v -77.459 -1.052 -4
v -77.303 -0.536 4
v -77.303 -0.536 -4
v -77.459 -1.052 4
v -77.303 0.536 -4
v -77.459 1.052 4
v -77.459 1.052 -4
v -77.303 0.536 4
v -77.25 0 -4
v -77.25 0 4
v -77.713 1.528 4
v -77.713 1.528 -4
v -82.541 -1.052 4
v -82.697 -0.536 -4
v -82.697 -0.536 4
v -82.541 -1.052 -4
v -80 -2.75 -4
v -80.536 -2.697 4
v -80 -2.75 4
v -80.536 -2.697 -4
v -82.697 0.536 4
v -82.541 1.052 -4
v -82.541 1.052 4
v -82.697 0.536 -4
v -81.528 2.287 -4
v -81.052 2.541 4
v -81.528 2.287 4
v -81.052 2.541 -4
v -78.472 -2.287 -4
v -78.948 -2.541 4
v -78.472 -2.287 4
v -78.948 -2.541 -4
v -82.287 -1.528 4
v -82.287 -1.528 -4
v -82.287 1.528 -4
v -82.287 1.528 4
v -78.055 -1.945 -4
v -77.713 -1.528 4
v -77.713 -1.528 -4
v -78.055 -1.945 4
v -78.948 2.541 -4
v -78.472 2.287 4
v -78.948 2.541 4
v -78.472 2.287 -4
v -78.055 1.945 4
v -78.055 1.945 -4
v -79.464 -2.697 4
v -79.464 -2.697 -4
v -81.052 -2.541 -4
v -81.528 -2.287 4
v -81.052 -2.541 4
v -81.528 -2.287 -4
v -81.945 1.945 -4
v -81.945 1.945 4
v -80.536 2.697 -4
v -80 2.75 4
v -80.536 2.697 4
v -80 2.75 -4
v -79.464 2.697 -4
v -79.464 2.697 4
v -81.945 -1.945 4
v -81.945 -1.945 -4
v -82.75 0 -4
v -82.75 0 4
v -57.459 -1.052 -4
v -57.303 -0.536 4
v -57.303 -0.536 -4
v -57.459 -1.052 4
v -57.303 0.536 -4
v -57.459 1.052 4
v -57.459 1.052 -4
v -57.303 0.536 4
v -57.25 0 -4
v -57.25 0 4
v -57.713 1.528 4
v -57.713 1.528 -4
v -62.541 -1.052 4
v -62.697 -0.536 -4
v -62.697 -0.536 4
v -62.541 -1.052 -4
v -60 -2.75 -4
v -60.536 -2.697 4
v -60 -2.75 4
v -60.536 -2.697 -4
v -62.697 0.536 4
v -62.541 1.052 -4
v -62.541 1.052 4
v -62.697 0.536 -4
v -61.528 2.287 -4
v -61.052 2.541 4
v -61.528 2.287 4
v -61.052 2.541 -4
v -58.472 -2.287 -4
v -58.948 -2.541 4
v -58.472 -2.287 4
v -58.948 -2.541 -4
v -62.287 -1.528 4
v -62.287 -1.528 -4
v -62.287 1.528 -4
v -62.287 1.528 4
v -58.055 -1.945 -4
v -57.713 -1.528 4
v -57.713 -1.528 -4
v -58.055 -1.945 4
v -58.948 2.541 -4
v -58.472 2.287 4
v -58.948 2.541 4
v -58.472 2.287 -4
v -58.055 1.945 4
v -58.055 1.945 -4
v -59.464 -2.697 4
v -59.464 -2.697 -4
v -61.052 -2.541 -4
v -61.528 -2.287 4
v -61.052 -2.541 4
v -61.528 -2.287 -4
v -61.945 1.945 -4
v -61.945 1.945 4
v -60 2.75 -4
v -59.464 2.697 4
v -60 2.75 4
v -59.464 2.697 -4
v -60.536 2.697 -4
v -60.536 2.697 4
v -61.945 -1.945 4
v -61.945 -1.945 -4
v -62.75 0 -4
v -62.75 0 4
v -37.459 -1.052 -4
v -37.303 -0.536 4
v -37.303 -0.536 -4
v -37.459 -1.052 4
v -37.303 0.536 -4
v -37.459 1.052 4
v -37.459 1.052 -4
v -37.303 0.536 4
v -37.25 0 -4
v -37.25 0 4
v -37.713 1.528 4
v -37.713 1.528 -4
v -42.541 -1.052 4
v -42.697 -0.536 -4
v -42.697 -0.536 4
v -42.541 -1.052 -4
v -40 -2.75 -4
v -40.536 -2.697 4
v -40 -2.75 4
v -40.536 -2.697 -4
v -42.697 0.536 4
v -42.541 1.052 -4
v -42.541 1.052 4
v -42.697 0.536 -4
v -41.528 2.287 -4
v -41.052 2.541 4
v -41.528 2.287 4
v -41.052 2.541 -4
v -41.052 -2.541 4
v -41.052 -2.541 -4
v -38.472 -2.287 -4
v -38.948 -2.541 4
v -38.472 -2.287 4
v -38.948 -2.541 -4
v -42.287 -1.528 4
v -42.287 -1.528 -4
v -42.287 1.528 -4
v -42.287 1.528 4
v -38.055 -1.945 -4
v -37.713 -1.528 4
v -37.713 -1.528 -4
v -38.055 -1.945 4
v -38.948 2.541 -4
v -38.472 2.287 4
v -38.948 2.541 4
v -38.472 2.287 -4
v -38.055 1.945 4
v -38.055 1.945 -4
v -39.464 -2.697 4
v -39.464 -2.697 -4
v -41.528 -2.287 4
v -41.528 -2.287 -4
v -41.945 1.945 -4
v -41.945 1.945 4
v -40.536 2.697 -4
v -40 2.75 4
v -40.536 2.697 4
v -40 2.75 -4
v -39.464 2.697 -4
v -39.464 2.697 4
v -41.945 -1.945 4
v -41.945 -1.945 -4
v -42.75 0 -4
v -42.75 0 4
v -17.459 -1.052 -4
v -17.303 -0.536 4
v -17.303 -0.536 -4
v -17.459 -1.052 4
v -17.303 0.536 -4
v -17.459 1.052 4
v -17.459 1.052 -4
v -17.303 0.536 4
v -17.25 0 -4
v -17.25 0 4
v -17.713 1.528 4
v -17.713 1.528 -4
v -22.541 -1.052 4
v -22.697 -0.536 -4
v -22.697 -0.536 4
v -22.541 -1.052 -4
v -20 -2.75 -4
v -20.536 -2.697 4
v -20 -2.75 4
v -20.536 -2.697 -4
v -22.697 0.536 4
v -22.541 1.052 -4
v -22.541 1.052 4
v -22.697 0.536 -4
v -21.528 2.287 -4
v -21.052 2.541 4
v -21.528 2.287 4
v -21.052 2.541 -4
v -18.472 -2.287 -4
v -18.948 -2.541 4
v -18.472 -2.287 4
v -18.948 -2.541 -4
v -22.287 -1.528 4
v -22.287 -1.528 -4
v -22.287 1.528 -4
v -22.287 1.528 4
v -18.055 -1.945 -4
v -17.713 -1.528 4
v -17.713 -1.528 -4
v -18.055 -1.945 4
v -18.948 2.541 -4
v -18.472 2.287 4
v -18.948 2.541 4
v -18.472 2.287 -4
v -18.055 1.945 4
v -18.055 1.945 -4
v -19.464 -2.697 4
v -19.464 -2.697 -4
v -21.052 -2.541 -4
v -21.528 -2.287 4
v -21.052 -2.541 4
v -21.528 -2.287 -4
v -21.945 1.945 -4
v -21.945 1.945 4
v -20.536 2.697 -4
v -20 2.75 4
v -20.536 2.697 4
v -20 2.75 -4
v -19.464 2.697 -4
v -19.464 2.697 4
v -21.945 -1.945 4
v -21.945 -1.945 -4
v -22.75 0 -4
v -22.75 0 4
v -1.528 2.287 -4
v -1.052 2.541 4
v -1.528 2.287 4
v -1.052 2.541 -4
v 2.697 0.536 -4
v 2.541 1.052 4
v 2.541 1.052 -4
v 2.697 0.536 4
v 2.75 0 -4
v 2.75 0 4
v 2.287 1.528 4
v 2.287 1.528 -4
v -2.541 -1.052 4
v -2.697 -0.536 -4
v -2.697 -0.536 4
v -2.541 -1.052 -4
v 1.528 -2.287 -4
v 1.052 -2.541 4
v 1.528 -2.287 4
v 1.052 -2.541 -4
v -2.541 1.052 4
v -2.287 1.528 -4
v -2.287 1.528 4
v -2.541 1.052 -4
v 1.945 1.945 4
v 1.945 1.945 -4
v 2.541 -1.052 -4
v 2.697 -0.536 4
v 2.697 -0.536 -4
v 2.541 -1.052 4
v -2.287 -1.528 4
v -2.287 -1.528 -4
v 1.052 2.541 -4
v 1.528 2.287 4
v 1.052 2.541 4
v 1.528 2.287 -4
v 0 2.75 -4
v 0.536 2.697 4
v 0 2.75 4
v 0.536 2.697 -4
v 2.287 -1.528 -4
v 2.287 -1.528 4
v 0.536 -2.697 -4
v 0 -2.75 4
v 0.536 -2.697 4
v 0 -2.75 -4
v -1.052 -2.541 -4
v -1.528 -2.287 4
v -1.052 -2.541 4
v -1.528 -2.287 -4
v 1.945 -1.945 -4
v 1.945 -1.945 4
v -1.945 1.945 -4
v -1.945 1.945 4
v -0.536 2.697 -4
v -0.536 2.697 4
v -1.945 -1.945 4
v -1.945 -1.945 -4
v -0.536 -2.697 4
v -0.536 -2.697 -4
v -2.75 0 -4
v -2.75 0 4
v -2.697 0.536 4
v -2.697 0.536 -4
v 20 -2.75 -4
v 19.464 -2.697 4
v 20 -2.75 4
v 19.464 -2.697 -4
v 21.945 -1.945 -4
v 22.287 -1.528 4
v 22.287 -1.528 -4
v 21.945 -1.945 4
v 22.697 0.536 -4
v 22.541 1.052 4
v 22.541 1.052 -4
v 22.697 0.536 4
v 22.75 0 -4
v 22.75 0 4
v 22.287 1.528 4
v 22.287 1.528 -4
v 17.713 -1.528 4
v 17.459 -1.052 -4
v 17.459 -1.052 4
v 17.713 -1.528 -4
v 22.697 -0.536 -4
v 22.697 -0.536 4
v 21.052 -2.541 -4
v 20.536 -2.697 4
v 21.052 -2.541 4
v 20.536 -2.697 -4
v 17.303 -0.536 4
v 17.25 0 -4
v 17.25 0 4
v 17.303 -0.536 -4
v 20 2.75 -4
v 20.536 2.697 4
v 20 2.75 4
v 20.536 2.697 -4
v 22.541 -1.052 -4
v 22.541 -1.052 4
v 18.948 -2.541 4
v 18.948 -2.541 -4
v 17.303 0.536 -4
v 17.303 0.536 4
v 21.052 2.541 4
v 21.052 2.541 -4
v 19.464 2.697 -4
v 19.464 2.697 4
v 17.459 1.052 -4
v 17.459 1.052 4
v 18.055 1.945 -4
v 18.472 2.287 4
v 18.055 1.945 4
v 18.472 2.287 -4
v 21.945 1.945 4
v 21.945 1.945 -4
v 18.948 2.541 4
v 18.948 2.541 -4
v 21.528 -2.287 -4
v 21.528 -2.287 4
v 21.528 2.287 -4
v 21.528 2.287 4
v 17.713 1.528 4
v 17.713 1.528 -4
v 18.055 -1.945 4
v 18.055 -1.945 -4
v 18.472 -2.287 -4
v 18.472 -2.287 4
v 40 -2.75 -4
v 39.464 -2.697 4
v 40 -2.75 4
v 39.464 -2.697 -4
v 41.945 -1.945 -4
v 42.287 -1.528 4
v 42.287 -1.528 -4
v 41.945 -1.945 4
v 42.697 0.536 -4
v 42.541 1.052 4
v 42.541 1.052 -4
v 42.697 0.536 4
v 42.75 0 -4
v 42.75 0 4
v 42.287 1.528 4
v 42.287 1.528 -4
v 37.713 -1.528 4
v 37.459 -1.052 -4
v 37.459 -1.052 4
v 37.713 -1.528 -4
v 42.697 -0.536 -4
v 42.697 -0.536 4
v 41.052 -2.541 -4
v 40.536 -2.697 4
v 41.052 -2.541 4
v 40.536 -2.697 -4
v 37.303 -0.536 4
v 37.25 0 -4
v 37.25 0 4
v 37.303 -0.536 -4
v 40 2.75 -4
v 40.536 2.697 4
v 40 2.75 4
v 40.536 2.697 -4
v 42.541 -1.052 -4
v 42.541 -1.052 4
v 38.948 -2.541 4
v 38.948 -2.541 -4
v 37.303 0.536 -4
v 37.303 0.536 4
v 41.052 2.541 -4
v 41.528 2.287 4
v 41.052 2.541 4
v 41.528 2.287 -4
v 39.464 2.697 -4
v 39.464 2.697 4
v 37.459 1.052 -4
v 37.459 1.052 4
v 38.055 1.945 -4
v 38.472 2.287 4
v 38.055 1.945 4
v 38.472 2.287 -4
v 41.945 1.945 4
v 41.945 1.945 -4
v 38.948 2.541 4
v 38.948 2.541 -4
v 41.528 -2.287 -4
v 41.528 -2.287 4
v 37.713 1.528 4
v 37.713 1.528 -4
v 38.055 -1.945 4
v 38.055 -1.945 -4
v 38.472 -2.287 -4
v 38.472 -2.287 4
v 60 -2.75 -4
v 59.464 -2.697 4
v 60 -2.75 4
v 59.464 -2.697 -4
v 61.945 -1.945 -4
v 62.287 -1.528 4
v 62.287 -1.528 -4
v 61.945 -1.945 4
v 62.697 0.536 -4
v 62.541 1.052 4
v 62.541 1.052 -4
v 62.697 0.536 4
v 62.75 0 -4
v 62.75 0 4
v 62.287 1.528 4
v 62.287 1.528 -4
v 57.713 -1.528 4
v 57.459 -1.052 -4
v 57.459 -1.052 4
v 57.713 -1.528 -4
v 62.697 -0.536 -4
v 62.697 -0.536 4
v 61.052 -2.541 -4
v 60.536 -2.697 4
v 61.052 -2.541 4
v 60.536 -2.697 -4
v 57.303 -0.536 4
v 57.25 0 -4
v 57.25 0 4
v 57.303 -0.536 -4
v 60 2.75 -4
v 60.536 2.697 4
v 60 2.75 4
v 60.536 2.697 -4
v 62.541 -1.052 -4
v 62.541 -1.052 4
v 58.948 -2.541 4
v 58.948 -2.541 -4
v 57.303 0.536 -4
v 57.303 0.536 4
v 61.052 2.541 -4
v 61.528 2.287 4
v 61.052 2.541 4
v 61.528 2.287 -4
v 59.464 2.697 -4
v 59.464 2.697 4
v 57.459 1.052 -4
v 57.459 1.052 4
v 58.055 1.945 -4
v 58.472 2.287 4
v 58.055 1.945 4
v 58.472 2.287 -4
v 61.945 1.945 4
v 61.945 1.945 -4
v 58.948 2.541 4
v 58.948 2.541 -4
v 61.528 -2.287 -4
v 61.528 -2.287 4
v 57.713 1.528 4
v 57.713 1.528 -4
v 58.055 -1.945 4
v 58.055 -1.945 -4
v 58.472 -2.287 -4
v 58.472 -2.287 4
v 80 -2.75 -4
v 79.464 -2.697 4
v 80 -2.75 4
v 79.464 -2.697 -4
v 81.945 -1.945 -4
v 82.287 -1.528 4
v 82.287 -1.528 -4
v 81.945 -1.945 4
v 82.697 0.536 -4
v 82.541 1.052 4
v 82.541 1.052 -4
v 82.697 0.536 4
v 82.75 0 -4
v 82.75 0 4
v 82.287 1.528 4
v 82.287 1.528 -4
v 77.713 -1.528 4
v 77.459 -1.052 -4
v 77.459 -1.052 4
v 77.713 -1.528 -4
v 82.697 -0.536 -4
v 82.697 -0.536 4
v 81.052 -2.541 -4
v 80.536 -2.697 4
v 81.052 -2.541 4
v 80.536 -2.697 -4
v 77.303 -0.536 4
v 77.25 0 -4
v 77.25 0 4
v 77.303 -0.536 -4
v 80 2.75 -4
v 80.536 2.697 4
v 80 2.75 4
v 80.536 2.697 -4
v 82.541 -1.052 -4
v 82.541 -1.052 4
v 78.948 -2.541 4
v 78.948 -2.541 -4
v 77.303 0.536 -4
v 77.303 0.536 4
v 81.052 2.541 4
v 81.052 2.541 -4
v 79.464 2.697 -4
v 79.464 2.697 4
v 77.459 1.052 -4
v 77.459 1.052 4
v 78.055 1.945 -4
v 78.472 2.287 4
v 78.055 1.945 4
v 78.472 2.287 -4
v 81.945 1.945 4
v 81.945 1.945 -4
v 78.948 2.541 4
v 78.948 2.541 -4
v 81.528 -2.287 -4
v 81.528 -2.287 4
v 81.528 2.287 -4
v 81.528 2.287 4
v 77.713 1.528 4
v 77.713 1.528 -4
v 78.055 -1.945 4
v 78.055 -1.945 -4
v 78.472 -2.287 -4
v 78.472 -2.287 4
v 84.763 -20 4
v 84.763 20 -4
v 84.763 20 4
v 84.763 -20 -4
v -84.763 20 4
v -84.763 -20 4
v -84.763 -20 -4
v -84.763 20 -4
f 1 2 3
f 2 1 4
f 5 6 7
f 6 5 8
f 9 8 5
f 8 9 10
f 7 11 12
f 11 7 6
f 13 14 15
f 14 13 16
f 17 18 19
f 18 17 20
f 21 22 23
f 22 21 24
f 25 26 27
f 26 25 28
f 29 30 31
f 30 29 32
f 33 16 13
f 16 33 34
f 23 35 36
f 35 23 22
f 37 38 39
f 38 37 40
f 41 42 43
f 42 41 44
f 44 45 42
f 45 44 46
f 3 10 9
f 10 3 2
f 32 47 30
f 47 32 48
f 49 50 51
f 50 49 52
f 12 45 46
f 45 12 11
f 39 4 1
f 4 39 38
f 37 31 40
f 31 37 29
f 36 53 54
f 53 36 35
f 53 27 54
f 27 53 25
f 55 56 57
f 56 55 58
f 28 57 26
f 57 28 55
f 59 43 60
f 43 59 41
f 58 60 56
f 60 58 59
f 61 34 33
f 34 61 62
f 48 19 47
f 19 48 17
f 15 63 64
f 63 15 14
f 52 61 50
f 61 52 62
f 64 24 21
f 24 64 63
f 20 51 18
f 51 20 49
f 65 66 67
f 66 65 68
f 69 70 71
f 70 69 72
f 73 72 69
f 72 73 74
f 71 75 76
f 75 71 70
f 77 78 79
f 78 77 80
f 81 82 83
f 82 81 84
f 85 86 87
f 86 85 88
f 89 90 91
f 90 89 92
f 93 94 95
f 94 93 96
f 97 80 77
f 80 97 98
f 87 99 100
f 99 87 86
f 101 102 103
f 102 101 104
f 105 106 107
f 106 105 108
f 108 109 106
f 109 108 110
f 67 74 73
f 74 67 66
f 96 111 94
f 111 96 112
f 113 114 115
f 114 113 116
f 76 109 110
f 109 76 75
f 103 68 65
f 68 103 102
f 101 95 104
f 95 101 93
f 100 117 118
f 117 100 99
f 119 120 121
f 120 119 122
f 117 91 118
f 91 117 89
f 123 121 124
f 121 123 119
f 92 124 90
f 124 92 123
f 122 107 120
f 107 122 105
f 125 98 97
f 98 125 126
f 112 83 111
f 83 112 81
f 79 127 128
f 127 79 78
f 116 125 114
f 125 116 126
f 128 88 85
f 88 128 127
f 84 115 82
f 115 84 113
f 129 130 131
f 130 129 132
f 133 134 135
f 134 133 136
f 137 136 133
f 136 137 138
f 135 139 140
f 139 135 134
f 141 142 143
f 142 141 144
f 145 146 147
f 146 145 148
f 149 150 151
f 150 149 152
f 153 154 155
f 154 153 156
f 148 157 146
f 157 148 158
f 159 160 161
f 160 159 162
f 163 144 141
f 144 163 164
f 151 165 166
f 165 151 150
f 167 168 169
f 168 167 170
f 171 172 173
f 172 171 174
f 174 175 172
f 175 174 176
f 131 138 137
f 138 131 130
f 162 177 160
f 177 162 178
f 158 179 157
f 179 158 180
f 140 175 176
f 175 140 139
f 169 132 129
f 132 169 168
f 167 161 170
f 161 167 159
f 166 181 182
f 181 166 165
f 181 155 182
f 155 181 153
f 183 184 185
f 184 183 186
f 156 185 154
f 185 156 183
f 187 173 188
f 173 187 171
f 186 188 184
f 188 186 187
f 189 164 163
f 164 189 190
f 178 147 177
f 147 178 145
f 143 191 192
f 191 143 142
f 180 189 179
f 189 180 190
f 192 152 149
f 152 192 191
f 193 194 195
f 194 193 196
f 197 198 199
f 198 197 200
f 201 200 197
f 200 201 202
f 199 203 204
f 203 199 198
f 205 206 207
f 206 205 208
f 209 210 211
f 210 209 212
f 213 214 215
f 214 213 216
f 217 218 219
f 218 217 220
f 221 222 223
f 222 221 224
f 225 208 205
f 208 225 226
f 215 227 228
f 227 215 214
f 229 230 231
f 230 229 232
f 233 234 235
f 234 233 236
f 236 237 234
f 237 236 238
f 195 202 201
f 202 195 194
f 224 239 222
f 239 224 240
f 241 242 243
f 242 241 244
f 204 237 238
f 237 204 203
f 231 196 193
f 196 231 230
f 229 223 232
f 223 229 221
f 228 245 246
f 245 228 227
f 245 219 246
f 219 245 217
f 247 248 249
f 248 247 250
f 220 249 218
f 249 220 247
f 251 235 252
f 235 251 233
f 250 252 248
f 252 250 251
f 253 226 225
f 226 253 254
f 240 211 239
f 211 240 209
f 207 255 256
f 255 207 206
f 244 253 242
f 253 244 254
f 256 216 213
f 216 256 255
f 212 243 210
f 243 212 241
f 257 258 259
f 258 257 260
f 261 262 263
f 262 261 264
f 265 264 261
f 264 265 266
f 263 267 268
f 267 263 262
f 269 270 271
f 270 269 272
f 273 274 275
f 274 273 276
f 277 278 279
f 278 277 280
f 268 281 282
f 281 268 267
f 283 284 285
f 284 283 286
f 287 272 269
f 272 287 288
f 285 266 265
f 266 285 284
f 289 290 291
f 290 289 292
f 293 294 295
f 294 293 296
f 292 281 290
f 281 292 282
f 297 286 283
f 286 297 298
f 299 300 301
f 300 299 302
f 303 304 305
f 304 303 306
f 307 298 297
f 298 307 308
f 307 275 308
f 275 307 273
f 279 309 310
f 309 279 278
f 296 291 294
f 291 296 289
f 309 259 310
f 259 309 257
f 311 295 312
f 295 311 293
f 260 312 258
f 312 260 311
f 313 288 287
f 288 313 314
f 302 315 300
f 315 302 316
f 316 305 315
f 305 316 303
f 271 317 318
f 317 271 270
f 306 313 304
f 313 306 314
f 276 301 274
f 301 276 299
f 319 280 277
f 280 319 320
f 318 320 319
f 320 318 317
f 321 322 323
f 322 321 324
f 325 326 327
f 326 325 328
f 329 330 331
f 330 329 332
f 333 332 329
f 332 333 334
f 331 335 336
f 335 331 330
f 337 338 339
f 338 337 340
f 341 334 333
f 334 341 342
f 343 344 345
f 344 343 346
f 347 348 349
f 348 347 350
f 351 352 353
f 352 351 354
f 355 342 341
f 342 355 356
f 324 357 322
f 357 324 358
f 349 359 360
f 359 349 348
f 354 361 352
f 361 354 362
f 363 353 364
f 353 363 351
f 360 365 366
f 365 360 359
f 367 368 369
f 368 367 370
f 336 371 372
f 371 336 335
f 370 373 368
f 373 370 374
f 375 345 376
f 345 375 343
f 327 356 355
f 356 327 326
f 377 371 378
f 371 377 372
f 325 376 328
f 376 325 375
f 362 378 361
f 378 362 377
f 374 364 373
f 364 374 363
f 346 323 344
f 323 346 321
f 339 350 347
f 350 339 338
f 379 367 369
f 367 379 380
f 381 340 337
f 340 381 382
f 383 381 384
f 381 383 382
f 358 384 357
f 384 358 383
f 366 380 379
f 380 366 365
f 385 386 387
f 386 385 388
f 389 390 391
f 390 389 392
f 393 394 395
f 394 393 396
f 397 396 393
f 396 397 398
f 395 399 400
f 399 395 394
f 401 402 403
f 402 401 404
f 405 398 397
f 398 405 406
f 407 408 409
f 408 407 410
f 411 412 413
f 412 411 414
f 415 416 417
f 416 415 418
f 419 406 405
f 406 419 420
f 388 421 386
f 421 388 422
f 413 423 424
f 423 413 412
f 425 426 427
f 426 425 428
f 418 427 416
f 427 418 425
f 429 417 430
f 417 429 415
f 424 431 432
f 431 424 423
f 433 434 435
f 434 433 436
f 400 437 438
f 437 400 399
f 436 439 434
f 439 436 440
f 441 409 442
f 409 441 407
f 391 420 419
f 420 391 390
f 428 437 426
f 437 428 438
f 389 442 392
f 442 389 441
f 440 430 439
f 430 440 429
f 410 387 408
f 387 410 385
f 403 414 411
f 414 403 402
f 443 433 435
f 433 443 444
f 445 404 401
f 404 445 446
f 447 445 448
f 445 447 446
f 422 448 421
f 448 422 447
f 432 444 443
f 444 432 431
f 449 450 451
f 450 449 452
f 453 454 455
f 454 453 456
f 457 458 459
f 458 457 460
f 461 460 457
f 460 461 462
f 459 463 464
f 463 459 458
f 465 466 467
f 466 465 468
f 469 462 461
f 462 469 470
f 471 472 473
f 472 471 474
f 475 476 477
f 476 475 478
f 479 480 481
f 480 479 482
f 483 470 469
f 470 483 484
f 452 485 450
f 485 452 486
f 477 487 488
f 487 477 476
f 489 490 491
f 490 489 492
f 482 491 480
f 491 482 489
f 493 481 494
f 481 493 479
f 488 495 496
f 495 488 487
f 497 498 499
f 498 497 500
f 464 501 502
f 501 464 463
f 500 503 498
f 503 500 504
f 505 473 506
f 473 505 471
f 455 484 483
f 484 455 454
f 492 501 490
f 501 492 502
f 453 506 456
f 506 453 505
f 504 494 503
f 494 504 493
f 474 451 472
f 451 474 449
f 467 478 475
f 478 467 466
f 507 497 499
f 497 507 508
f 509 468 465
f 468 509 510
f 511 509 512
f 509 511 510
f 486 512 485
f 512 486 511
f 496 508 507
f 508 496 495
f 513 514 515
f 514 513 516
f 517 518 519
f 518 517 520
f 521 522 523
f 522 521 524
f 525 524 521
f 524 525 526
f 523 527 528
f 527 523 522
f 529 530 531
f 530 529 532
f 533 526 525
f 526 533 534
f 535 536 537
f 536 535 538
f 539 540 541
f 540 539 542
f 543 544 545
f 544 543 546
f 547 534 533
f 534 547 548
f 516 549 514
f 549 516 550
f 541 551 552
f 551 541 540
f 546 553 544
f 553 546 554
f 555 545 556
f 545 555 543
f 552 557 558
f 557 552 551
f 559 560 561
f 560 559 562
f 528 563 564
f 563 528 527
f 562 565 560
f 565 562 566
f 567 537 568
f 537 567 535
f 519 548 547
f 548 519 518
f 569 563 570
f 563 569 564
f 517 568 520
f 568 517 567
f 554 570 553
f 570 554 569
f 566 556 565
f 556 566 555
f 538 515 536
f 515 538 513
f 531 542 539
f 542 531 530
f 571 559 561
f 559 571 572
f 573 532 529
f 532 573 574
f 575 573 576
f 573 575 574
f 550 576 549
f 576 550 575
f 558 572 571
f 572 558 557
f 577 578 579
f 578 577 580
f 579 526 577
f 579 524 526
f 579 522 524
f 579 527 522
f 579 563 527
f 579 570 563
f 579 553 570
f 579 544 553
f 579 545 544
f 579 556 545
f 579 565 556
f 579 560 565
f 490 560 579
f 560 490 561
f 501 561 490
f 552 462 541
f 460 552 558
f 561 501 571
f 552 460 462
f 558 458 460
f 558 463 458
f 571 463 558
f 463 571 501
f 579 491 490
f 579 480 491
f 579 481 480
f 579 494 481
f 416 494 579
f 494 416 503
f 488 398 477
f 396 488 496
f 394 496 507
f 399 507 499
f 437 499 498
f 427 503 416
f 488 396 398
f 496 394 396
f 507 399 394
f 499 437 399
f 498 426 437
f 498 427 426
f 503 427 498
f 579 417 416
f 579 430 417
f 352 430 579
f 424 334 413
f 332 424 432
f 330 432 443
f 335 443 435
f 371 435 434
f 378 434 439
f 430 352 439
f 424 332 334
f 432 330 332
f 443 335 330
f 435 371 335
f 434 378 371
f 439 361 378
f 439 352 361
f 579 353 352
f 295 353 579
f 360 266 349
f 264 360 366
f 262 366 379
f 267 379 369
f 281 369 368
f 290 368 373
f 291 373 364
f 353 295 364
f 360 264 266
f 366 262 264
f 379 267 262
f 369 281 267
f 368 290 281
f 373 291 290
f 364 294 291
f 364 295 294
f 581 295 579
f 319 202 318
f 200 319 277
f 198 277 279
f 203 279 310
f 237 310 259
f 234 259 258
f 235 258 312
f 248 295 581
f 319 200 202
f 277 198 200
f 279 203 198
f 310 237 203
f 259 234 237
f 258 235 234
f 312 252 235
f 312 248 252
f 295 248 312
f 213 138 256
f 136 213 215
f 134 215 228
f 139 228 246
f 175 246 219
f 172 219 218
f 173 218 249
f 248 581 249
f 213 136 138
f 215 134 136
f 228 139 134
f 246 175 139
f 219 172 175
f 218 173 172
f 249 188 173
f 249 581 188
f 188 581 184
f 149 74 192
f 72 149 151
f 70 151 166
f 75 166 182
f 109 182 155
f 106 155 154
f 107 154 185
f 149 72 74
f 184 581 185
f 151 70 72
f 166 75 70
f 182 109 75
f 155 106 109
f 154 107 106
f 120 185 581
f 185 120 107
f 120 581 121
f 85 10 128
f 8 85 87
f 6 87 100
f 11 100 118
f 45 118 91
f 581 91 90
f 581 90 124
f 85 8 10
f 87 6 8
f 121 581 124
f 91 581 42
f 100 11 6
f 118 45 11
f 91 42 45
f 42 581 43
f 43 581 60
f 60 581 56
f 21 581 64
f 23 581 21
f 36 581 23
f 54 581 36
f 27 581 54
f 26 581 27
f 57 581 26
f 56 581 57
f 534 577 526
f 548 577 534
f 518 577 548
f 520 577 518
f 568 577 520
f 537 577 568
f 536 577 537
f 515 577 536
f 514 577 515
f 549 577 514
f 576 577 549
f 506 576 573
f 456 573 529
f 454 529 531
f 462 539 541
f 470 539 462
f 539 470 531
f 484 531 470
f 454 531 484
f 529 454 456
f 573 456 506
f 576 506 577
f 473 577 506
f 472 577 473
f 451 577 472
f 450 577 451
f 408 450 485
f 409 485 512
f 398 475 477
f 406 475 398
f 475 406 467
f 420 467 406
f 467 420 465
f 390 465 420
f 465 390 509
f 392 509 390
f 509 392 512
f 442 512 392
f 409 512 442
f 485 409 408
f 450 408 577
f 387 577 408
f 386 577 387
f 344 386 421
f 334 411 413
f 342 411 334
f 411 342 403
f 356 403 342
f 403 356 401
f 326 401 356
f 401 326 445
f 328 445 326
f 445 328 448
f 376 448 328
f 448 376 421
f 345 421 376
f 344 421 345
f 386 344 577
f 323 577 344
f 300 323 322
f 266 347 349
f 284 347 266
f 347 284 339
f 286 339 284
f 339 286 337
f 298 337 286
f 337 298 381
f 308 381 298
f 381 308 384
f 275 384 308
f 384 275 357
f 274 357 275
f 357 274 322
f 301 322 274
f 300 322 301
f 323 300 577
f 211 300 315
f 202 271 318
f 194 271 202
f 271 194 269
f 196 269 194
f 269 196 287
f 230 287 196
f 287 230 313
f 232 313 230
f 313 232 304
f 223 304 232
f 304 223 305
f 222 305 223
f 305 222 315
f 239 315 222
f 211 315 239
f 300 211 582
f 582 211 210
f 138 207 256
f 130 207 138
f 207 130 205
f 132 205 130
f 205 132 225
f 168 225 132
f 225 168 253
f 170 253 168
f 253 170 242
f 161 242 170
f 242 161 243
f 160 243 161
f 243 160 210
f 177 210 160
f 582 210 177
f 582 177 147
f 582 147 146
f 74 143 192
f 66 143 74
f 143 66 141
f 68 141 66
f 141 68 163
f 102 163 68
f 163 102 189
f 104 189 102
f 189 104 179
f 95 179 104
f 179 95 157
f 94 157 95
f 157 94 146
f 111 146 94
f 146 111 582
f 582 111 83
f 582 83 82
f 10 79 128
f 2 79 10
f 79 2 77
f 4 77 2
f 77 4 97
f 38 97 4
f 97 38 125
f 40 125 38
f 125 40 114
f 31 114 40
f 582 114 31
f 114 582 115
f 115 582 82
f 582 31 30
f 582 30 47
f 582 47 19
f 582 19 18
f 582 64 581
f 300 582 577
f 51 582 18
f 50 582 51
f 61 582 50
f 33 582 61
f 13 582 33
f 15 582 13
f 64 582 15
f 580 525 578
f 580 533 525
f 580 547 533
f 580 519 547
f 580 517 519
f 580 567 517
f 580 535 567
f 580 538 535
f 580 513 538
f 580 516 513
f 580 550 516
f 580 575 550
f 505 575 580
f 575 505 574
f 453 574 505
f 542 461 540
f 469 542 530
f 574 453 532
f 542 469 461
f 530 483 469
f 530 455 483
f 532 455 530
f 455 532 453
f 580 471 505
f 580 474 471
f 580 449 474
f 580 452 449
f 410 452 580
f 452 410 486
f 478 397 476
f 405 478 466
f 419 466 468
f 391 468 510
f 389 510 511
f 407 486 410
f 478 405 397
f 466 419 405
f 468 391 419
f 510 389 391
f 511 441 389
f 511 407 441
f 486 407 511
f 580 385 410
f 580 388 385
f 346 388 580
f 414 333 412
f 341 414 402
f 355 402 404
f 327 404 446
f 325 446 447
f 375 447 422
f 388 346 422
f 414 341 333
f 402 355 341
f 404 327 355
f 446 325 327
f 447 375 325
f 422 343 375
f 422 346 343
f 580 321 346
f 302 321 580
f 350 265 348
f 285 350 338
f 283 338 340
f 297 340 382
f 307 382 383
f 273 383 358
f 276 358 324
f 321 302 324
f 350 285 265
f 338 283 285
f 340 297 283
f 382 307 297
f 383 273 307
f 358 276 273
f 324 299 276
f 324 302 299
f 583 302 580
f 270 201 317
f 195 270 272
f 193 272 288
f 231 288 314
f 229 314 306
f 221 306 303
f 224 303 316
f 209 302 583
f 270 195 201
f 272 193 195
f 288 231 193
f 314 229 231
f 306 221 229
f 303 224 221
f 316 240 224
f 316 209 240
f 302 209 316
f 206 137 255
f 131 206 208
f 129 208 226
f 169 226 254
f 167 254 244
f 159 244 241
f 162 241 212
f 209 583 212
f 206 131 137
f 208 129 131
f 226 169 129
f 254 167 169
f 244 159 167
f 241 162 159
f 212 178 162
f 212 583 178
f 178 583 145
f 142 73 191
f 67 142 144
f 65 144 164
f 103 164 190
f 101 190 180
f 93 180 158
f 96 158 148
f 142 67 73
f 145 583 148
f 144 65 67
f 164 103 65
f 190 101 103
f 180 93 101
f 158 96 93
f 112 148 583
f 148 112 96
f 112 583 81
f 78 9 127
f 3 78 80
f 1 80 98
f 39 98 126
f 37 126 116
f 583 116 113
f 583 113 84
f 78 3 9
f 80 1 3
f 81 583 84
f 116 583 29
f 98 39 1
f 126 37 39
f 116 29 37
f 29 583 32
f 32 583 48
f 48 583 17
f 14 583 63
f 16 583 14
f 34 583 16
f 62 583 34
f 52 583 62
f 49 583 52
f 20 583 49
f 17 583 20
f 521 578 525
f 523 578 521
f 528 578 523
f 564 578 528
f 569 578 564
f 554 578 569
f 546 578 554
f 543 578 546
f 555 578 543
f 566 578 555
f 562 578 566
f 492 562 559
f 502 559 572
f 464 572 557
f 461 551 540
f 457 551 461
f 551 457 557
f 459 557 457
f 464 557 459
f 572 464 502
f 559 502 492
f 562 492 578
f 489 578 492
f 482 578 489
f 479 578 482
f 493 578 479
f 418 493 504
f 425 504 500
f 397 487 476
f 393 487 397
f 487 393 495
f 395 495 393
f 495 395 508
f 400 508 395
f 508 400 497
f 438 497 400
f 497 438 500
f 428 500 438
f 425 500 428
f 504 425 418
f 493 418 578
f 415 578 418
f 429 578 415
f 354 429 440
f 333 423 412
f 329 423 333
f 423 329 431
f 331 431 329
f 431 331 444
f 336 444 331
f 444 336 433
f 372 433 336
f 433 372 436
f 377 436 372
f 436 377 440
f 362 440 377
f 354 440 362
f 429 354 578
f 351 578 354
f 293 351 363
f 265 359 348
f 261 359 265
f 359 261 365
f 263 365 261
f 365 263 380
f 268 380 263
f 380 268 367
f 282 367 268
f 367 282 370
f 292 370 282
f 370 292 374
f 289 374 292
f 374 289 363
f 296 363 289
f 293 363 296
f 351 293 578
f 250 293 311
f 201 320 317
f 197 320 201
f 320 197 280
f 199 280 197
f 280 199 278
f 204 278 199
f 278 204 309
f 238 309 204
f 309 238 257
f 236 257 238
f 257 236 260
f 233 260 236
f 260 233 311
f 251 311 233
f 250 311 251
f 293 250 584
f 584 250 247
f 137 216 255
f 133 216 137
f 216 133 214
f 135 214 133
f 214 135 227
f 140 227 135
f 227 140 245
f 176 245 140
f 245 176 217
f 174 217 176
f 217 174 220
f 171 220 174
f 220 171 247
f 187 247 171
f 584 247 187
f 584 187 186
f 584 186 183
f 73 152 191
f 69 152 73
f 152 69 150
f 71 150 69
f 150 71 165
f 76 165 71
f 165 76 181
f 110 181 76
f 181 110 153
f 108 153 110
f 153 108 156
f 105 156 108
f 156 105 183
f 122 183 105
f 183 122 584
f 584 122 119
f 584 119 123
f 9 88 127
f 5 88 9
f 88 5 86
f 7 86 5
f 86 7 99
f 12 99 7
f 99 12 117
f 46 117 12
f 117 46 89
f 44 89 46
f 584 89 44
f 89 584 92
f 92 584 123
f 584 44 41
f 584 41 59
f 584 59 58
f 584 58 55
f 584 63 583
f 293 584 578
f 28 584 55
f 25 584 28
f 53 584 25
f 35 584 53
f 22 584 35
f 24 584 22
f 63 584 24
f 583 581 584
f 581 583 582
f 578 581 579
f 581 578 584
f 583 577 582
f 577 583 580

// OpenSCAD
$fn = 32;

// ----------------------------------------------------------------------
// Hole bar, 9 x Ø5.5
// skip layout, 4.7625 mm edge offset
// ----------------------------------------------------------------------

// --- parameters (mm) ---
bar_w = 40;       // bar width (Y)
bar_t = 8;        // bar thickness (Z)
holes = 9;        // holes per row
hole_d = 5.5;     // hole diameter
edge = 4.763;     // offset from the bar end to the first hole
grid_pitch = 10;  // grid the bar was laid out on

// --- derived feature positions (mm) ---
pitch = grid_pitch * 2;       // = 20   holes sit every other grid slot
span = (holes - 1) * pitch;   // = 160   distance between the end holes
bar_l = span + 2 * edge;      // = 169.53   overall bar length
start_x = -bar_l / 2 + edge;  // = -80   X of the first hole
feature_centers = [
  [start_x + 0 * pitch, 0],
  [start_x + 1 * pitch, 0],
  [start_x + 2 * pitch, 0],
  [start_x + 3 * pitch, 0],
  [start_x + 4 * pitch, 0],
  [start_x + 5 * pitch, 0],
  [start_x + 6 * pitch, 0],
  [start_x + 7 * pitch, 0],
  [start_x + 8 * pitch, 0]
];   // hole centres of the first row

// bar with one row of holes, drilled from feature_centers
difference() {
  translate([-bar_l / 2, -bar_w / 2, -bar_t / 2]) cube([bar_l, bar_w, bar_t]);
  for (centre = feature_centers)
    translate([centre[0], centre[1], 0])
      cylinder(d = hole_d, h = bar_t + 2, center = true);
}
